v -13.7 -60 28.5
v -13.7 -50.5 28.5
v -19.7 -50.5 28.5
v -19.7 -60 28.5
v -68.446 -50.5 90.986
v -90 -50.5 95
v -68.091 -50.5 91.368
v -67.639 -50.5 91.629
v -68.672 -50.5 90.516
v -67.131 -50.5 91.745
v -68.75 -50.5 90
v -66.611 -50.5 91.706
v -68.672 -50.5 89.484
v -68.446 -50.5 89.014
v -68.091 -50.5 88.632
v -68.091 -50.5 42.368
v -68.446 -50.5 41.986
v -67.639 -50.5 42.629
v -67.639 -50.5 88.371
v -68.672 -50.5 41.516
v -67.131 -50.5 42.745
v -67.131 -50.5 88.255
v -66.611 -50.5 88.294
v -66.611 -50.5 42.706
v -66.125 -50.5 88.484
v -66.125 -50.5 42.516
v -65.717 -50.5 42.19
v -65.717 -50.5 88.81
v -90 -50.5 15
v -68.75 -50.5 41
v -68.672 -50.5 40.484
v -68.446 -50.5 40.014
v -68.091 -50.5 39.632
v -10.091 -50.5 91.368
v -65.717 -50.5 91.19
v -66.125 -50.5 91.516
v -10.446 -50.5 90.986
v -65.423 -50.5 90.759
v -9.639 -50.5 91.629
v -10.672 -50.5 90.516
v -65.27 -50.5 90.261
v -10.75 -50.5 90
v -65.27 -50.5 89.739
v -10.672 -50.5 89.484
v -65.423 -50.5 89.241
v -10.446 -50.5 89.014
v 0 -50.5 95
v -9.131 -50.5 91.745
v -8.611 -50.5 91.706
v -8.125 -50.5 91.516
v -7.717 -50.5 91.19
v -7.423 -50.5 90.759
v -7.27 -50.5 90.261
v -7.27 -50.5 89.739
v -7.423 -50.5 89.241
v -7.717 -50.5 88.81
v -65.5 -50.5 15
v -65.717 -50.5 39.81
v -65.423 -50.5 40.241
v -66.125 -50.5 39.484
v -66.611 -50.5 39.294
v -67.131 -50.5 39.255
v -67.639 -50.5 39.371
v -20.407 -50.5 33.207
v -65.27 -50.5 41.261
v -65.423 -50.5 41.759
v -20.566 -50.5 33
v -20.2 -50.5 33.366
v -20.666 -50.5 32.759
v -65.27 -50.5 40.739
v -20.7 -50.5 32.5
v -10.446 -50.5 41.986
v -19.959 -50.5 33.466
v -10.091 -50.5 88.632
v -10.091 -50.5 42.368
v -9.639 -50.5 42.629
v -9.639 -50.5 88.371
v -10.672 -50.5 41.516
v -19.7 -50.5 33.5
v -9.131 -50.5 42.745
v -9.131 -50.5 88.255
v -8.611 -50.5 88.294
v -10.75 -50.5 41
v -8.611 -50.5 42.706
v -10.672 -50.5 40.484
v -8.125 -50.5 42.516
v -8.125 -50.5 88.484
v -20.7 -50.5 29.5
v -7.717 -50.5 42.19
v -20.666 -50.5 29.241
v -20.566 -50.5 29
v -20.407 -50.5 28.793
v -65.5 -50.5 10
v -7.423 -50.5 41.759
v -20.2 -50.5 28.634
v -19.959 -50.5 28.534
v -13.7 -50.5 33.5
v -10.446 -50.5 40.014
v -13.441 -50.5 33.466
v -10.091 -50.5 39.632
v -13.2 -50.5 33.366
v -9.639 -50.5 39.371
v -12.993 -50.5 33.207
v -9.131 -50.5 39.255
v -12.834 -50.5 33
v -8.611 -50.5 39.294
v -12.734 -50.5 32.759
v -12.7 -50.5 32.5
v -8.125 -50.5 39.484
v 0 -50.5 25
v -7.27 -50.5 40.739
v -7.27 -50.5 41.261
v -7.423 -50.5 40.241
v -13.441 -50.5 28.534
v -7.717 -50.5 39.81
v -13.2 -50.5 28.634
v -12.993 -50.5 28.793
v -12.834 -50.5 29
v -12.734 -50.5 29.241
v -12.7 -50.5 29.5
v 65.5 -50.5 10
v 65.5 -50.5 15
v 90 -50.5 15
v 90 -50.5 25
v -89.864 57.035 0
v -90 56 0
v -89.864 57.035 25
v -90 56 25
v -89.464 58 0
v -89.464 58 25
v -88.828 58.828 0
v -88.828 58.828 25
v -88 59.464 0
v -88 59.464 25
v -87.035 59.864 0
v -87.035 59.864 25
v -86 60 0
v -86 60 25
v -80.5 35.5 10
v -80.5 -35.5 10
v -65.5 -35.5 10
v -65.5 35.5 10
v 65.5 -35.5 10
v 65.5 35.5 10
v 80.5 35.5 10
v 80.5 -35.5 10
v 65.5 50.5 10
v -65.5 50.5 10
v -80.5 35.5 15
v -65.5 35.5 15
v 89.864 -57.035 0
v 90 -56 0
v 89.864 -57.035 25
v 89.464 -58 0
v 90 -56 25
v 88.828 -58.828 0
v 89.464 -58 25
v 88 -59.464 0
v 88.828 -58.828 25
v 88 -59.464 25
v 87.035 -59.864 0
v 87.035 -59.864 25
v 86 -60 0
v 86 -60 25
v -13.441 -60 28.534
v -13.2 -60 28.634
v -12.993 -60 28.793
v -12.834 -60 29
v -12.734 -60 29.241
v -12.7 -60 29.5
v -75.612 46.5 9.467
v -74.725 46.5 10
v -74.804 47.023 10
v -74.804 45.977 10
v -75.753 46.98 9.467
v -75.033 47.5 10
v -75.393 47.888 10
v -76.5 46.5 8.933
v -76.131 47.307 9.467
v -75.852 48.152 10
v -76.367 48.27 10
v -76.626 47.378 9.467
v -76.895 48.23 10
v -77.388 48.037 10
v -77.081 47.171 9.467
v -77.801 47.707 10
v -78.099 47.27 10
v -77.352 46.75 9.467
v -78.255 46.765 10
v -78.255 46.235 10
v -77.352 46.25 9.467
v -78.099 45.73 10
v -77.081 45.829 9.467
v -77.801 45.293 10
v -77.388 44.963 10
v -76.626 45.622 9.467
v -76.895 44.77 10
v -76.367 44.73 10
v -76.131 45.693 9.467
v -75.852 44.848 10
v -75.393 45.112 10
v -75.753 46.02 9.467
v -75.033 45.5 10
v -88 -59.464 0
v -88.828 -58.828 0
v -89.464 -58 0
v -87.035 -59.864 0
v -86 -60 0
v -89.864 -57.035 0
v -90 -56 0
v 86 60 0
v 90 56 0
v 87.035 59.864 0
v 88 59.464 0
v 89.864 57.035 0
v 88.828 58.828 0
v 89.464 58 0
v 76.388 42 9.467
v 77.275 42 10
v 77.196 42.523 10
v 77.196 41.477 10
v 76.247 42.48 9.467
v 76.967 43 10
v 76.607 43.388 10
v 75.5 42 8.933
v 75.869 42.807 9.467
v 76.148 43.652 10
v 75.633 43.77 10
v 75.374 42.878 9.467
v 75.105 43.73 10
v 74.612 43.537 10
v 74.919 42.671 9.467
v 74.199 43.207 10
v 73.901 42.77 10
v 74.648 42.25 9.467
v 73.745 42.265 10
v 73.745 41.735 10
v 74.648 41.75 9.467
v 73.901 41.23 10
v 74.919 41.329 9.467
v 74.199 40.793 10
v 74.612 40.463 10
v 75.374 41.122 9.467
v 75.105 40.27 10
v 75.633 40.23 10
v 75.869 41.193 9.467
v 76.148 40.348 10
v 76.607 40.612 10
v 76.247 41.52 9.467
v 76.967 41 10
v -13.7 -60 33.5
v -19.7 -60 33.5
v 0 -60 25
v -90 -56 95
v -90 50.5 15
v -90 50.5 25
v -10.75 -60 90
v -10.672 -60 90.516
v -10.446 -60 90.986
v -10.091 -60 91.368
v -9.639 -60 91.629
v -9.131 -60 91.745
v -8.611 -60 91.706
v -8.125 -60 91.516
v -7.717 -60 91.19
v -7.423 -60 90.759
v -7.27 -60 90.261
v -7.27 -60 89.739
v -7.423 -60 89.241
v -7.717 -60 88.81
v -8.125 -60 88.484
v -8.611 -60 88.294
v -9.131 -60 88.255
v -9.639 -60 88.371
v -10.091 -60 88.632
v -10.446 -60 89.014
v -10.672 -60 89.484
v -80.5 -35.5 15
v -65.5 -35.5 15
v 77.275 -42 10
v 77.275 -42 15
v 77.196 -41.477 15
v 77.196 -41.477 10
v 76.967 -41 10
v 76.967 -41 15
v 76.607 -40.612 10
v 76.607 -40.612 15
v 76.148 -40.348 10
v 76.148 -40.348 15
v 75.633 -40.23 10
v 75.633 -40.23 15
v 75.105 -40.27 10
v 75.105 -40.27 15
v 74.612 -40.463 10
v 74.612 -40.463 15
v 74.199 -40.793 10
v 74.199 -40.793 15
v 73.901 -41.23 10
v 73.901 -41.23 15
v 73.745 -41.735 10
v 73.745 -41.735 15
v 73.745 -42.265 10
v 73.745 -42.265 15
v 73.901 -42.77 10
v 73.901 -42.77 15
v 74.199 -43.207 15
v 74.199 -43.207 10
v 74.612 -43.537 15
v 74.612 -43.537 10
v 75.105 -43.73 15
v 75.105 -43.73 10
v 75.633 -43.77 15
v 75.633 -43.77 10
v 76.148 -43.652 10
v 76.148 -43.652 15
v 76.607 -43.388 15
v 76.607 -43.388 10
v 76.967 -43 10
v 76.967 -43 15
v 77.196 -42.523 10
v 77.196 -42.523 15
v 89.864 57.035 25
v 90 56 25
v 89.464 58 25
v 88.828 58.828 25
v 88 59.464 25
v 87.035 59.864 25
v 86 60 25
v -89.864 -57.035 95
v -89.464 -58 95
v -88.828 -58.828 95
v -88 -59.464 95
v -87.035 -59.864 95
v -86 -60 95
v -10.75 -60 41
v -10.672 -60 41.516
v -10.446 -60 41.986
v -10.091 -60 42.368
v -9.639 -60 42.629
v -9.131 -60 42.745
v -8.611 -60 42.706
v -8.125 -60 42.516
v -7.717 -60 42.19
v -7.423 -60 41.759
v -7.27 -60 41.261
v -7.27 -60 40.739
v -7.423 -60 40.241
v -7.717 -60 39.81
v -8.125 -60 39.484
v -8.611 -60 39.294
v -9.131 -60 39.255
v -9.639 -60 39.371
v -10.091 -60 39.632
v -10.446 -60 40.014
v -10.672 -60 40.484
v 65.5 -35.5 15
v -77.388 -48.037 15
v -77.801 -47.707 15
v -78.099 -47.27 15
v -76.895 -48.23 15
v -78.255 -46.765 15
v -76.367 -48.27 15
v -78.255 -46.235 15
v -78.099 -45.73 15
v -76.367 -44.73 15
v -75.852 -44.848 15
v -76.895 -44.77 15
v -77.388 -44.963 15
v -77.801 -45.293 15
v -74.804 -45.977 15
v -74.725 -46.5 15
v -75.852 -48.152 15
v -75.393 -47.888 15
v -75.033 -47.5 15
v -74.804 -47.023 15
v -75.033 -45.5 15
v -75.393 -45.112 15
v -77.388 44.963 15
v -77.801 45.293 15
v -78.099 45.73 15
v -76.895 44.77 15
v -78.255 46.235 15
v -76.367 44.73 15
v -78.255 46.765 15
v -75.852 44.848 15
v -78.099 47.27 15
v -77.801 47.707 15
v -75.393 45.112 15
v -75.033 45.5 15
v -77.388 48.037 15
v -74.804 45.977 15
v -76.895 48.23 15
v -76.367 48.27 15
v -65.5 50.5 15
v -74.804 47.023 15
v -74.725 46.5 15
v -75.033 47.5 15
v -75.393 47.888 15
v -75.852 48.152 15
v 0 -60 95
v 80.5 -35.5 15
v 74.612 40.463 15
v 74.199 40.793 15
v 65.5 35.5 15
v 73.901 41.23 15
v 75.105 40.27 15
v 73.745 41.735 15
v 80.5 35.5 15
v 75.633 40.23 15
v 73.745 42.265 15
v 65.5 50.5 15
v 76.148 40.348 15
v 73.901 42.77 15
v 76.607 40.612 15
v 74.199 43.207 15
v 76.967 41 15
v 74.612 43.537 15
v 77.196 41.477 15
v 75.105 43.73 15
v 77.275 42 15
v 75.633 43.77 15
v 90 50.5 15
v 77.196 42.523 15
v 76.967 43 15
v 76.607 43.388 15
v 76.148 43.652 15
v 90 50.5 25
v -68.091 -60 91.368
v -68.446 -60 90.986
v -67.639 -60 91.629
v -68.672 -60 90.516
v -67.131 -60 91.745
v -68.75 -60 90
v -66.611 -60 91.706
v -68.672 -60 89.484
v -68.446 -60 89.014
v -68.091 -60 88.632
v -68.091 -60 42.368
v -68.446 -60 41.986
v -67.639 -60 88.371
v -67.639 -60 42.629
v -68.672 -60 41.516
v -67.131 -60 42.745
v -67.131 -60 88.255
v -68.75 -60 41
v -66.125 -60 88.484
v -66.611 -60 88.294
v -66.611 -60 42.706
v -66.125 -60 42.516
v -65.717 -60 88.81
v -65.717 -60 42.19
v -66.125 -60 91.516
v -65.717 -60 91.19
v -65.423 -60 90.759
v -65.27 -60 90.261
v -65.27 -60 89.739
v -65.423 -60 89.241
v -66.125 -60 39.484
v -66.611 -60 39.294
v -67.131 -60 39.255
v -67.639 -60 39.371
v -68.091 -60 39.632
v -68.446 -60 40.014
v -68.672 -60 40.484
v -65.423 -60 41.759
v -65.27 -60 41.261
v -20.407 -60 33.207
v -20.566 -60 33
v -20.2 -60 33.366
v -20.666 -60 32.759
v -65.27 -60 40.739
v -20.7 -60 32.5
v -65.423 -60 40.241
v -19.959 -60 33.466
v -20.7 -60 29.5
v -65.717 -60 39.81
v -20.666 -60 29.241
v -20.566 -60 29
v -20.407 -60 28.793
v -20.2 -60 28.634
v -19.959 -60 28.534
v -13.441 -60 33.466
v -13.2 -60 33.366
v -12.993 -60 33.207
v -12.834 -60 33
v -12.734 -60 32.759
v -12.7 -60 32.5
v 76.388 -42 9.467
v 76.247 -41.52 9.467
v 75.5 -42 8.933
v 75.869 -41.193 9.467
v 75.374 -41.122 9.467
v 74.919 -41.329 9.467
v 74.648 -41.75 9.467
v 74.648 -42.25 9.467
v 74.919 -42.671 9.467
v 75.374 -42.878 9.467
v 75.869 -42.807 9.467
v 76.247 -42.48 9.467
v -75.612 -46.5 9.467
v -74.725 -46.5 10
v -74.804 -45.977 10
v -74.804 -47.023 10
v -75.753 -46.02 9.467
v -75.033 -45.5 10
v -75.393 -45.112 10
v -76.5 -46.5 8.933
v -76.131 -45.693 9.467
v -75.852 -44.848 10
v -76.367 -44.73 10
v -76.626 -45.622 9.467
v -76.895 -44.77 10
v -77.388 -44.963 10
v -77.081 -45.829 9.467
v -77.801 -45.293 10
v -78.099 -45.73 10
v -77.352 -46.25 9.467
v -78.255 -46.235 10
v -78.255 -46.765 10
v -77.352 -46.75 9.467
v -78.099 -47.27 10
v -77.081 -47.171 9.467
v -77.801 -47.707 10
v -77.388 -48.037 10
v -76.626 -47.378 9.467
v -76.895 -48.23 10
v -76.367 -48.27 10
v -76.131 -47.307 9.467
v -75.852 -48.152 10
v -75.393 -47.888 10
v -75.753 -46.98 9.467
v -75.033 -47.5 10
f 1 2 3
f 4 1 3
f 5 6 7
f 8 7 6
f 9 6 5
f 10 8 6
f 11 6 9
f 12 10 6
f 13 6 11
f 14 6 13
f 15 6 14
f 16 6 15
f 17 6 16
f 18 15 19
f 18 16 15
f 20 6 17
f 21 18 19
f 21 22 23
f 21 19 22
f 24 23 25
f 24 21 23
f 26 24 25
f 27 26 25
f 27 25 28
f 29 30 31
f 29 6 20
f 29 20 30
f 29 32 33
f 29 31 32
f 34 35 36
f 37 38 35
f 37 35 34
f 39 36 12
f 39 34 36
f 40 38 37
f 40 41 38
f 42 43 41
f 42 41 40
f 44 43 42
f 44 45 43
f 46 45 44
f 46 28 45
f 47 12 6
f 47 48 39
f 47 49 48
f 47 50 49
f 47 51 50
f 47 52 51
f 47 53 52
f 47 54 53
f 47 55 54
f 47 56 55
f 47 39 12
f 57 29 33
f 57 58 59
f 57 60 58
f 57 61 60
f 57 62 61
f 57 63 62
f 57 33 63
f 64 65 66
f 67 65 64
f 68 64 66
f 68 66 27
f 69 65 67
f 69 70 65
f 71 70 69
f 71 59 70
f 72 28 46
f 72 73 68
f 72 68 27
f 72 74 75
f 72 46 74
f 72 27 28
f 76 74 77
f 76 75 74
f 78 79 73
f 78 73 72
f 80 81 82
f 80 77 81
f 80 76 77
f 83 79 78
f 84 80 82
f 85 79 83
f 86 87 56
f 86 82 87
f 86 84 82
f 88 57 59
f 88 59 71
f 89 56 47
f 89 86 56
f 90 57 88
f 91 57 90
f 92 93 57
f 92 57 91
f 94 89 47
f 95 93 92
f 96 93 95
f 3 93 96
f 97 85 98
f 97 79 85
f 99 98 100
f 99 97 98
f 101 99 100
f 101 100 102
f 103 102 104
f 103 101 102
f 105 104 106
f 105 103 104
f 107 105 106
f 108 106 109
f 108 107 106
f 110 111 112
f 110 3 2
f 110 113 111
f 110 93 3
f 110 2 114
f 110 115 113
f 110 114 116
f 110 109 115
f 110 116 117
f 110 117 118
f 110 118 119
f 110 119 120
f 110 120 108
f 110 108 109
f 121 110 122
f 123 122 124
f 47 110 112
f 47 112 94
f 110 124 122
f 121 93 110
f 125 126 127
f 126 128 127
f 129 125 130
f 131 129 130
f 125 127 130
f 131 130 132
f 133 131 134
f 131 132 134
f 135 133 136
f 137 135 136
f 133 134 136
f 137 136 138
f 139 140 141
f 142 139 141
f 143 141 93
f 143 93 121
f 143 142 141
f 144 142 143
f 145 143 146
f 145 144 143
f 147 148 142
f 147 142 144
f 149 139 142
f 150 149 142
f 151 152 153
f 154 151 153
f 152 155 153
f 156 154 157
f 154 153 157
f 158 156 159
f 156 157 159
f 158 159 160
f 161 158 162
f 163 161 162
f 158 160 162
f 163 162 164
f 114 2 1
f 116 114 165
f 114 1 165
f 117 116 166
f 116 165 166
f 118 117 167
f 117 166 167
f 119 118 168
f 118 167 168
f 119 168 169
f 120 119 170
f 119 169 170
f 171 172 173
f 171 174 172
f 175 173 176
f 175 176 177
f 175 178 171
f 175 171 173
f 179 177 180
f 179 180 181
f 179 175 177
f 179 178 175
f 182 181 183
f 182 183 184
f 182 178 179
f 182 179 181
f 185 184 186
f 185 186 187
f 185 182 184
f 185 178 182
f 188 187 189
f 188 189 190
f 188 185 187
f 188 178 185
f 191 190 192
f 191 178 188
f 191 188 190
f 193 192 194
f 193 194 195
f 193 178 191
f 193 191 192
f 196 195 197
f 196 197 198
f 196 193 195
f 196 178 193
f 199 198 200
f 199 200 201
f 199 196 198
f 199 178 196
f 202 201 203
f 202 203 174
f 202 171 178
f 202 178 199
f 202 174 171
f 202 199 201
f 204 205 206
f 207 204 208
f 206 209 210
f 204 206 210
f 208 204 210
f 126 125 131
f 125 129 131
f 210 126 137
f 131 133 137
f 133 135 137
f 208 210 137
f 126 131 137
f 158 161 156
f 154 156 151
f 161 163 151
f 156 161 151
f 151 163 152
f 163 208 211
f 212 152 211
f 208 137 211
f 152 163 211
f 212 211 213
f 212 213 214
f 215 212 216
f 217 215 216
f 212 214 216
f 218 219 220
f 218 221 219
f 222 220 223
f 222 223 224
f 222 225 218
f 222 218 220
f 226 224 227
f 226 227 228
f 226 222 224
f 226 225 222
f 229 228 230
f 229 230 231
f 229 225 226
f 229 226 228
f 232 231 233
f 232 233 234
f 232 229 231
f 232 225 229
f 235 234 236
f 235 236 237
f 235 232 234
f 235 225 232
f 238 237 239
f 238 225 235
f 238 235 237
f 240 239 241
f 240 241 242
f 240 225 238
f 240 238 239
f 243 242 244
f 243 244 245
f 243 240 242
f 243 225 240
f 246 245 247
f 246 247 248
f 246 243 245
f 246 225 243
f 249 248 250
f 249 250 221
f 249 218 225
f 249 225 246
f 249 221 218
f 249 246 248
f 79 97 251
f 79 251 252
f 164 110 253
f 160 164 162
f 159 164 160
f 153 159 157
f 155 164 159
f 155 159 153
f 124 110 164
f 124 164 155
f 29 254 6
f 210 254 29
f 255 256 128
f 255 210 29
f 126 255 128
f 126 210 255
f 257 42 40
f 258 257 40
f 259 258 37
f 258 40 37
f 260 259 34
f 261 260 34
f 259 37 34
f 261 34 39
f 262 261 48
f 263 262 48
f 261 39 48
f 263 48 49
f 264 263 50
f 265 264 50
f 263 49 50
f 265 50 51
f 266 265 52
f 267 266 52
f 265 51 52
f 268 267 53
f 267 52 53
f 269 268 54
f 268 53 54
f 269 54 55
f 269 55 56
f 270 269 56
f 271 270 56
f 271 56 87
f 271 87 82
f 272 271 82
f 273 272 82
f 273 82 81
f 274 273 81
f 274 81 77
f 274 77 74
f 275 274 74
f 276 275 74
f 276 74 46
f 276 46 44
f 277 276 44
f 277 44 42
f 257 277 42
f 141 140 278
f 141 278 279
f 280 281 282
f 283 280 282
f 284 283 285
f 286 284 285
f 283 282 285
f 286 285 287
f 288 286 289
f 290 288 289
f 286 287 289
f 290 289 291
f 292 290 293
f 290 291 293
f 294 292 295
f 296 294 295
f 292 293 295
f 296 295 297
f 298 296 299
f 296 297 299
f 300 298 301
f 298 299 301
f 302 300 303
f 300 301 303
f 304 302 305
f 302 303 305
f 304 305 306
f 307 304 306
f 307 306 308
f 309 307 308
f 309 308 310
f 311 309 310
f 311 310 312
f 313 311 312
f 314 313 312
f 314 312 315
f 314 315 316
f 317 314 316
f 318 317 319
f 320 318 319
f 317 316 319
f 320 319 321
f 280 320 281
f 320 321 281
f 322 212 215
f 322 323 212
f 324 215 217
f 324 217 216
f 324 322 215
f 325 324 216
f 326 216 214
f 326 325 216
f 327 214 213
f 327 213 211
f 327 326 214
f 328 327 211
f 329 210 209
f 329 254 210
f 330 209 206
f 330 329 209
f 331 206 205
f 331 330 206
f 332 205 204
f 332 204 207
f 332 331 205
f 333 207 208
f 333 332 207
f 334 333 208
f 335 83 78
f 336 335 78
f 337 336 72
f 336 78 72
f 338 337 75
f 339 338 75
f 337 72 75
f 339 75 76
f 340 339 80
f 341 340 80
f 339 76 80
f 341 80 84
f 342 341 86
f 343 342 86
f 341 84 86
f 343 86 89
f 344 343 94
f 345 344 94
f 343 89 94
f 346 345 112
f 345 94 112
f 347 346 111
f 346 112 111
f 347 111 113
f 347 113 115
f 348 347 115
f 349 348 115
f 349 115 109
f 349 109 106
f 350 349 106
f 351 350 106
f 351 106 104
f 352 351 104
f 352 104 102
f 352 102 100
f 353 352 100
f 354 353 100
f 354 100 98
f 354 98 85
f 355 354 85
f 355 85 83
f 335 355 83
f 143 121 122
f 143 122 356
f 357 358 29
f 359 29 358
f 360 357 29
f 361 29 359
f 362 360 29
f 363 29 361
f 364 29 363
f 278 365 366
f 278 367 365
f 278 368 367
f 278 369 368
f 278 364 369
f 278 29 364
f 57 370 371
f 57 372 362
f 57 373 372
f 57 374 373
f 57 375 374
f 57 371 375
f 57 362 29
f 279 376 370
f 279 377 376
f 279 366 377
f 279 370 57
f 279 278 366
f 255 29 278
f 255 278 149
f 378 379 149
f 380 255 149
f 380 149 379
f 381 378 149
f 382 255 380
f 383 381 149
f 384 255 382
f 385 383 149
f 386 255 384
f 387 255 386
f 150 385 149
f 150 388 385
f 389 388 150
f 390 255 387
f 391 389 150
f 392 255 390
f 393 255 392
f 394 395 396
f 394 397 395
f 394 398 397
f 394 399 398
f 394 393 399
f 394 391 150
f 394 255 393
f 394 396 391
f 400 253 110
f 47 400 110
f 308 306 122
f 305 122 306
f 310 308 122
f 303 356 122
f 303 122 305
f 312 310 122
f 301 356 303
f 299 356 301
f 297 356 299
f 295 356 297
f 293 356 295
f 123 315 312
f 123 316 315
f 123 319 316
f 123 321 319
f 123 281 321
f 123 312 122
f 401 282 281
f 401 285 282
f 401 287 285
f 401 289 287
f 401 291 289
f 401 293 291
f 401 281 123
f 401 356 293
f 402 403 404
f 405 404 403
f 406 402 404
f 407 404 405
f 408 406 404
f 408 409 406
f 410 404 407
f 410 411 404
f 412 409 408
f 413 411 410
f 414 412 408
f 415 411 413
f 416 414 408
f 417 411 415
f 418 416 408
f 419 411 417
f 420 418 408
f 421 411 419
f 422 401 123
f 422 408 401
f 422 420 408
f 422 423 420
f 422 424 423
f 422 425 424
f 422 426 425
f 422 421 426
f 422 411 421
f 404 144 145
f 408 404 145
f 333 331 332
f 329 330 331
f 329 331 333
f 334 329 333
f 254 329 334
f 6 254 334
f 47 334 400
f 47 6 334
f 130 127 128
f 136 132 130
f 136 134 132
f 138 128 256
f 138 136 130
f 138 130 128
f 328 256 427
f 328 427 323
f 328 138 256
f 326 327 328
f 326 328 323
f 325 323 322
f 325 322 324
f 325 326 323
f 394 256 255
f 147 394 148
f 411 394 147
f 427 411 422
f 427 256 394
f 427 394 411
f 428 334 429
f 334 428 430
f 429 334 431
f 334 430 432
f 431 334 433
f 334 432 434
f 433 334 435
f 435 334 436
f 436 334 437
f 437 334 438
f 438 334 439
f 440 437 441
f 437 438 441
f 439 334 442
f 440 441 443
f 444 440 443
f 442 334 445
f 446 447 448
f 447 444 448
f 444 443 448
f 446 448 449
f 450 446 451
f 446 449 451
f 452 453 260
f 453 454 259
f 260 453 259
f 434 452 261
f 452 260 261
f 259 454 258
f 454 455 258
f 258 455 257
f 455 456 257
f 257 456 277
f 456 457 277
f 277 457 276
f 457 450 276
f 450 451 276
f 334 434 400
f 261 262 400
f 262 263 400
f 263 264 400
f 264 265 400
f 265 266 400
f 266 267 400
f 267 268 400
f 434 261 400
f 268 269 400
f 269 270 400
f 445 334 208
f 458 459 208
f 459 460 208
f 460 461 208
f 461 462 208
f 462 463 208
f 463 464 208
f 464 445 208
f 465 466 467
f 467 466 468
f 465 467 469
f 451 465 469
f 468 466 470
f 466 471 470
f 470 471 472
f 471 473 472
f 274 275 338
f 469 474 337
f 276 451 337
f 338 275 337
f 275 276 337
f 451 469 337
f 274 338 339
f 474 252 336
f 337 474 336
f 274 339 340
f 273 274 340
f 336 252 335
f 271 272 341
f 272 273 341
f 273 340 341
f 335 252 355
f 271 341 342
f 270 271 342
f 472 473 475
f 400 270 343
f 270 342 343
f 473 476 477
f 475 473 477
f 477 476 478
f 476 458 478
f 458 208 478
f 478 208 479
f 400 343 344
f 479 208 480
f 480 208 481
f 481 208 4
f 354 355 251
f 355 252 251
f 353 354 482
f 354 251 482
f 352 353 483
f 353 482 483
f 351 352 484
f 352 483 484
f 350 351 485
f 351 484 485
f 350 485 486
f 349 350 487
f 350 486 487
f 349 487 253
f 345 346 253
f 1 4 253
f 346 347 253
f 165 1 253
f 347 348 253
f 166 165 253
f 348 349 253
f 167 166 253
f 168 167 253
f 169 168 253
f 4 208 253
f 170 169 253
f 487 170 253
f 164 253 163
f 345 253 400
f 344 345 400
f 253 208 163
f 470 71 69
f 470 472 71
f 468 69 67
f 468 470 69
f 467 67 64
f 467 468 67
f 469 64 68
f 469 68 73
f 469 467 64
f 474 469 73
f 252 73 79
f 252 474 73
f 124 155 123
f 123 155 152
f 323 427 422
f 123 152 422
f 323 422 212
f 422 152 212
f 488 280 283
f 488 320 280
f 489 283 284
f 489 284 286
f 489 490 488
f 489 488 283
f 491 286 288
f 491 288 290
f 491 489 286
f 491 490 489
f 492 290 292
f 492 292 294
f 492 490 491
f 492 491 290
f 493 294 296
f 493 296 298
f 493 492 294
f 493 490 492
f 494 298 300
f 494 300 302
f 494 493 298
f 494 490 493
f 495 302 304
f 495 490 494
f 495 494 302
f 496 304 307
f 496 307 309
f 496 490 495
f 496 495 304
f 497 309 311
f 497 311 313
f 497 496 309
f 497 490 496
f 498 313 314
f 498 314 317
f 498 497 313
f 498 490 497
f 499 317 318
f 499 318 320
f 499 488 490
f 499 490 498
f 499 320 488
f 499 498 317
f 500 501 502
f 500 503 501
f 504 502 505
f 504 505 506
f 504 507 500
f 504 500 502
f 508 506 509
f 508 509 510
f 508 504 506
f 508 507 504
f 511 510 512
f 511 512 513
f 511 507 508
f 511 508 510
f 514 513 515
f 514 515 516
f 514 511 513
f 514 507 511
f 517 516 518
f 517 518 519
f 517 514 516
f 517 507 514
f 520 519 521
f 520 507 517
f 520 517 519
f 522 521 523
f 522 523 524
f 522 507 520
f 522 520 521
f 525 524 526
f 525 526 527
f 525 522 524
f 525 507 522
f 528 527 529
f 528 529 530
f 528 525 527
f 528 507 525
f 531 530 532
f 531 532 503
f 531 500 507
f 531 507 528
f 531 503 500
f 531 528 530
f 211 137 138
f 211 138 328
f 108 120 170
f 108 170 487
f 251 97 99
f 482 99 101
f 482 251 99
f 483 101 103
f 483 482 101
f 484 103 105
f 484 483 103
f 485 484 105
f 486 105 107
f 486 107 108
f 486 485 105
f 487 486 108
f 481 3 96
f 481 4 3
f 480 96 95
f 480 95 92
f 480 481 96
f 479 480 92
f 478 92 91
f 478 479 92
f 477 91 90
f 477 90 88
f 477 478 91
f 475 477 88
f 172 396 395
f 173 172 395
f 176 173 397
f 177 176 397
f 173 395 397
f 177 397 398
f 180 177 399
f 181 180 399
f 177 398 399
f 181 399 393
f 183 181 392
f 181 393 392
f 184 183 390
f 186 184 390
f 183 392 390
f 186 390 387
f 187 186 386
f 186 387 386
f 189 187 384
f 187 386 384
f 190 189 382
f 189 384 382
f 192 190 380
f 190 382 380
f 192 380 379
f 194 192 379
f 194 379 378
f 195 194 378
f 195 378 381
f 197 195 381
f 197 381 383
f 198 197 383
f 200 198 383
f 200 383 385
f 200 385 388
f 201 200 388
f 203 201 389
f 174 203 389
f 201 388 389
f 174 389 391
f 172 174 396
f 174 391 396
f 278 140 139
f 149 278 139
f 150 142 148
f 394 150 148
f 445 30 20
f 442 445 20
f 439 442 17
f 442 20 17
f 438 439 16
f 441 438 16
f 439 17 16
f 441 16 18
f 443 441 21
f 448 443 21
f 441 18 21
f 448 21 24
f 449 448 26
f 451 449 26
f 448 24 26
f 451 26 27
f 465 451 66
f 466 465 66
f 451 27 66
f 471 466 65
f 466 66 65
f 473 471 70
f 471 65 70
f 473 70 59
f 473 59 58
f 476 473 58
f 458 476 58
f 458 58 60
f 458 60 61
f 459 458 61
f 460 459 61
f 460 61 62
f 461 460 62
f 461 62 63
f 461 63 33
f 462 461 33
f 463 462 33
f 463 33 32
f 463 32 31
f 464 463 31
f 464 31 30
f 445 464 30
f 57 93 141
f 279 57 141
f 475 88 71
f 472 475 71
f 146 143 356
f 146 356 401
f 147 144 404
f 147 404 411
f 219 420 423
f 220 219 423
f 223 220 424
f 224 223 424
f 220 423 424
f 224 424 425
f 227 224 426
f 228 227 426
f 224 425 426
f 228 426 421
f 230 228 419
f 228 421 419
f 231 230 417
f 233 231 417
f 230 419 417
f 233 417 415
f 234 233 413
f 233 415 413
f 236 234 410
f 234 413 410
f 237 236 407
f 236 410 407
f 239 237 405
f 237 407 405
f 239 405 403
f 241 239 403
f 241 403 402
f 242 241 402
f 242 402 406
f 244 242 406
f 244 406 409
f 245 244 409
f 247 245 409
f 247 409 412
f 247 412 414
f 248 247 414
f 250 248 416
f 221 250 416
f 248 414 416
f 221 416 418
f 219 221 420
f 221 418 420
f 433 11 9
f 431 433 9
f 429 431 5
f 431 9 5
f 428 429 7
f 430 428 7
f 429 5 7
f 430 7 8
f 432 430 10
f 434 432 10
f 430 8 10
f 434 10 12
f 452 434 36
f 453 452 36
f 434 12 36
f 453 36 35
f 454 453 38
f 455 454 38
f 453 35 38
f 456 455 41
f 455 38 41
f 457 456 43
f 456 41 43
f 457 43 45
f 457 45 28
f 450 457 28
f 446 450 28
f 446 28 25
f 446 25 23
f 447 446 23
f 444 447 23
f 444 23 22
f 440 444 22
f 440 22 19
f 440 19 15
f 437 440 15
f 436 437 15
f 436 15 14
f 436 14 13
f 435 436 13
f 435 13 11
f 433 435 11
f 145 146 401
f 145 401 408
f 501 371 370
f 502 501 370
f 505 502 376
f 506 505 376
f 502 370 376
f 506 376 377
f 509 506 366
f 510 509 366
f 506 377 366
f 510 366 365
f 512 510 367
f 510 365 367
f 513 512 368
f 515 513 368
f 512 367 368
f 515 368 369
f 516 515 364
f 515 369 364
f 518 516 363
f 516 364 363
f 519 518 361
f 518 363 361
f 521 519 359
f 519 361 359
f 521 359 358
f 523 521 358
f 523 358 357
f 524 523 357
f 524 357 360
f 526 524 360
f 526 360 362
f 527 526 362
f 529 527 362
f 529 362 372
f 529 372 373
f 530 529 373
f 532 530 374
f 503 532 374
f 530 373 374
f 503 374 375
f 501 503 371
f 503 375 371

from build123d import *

# Parameters (mm, degrees)
SKETCH_W        = 161
SKETCH_H        = 101
PAD_DEPTH       = 10
SKETCH001_W     = 15
SKETCH001_H     = 15
PAD001_DEPTH    = 5
SKETCH003_R     = 1.775
HOLE_DEPTH      = 5
HOLE_TIPS_R     = 1.775
SKETCH005_W     = 180
SKETCH005_H     = 120
SKETCH005_W_2   = 161
SKETCH005_H_2   = 101
PAD002_DEPTH    = 25
SKETCH006_W     = 9.5
SKETCH006_H     = 101
POCKET_DEPTH    = 10
SKETCH007_W     = 9.5
SKETCH007_H     = 101
POCKET001_DEPTH = 10
SKETCH008_W     = 90
SKETCH008_H     = 9.5
PAD003_DEPTH    = 70
SKETCH009_R     = 1.75
HOLE001_DEPTH   = 25
SKETCH010_W     = 8
SKETCH010_H     = 5
POCKET002_DEPTH = 10
FILLET_R        = 1
FILLET001_R     = 4


with BuildPart() as part:
    # Sketch → Pad (new body)
    with BuildSketch(Plane.XY):
        Rectangle(SKETCH_W, SKETCH_H)
    extrude(amount=PAD_DEPTH)

    # Sketch001 (on Face6 of Pad) → Pad001 (join)
    with BuildSketch(Plane.XY.offset(10)):
        with Locations((-73, 43)):
            Rectangle(SKETCH001_W, SKETCH001_H)
        with Locations((-73, -43)):
            Rectangle(SKETCH001_W, SKETCH001_H)
        with Locations((73, -43)):
            Rectangle(SKETCH001_W, SKETCH001_H)
        with Locations((73, 43)):
            Rectangle(SKETCH001_W, SKETCH001_H)
    extrude(amount=PAD001_DEPTH)

    # Sketch003 (on Face25 of Pad001) → Hole (cut)
    with BuildSketch(Plane.XY.offset(15)):
        with Locations((-76.5, -46.5)):
            Circle(SKETCH003_R)
        with Locations((-76.5, 46.5)):
            Circle(SKETCH003_R)
        with Locations((75.5, -42)):
            Circle(SKETCH003_R)
        with Locations((75.5, 42)):
            Circle(SKETCH003_R)
    extrude(amount=-HOLE_DEPTH, mode=Mode.SUBTRACT)

    # Hole tips → Hole tip 1 section 0
    with BuildSketch(Plane.XY.offset(10), mode=Mode.PRIVATE) as hole_tip_1_s0:
        with Locations((-76.5, -46.5)):
            Circle(HOLE_TIPS_R)
    loft([hole_tip_1_s0.sketch, Vertex(-76.5, -46.5, 8.933472)], mode=Mode.SUBTRACT)

    # Hole tips → Hole tip 2 section 0
    with BuildSketch(Plane.XY.offset(10), mode=Mode.PRIVATE) as hole_tip_2_s0:
        with Locations((-76.5, 46.5)):
            Circle(HOLE_TIPS_R)
    loft([hole_tip_2_s0.sketch, Vertex(-76.5, 46.5, 8.933472)], mode=Mode.SUBTRACT)

    # Hole tips → Hole tip 3 section 0
    with BuildSketch(Plane.XY.offset(10), mode=Mode.PRIVATE) as hole_tip_3_s0:
        with Locations((75.5, -42)):
            Circle(HOLE_TIPS_R)
    loft([hole_tip_3_s0.sketch, Vertex(75.5, -42, 8.933472)], mode=Mode.SUBTRACT)

    # Hole tips → Hole tip 4 section 0
    with BuildSketch(Plane.XY.offset(10), mode=Mode.PRIVATE) as hole_tip_4_s0:
        with Locations((75.5, 42)):
            Circle(HOLE_TIPS_R)
    loft([hole_tip_4_s0.sketch, Vertex(75.5, 42, 8.933472)], mode=Mode.SUBTRACT)

    # Sketch005 → Pad002 (join)
    with BuildSketch(Plane.XY):
        Rectangle(SKETCH005_W, SKETCH005_H)
        Rectangle(SKETCH005_W_2, SKETCH005_H_2, mode=Mode.SUBTRACT)
    extrude(amount=PAD002_DEPTH)

    # Sketch006 (on Face7 of Pad002) → Pocket (cut)
    with BuildSketch(Plane.XY.offset(25)):
        with Locations((85.25, 0)):
            Rectangle(SKETCH006_W, SKETCH006_H)
    extrude(amount=-POCKET_DEPTH, mode=Mode.SUBTRACT)

    # Sketch007 (on Face7 of Pocket) → Pocket001 (cut)
    with BuildSketch(Plane.XY.offset(25)):
        with Locations((-85.25, 0)):
            Rectangle(SKETCH007_W, SKETCH007_H)
    extrude(amount=-POCKET001_DEPTH, mode=Mode.SUBTRACT)

    # Sketch008 (on Face7 of Pocket001) → Pad003 (join)
    with BuildSketch(Plane.XY.offset(25)):
        with Locations((-45, -55.25)):
            Rectangle(SKETCH008_W, SKETCH008_H)
    extrude(amount=PAD003_DEPTH)

    # Sketch009 (on Face18 of Pad003) → Hole001 (cut)
    with BuildSketch(Plane(origin=(0, -50.5, 0), x_dir=(-1, 0, 0), z_dir=(0, 1, 0))):
        with Locations((67, 90)):
            Circle(SKETCH009_R)
        with Locations((9, 90)):
            Circle(SKETCH009_R)
        with Locations((9, 41)):
            Circle(SKETCH009_R)
        with Locations((67, 41)):
            Circle(SKETCH009_R)
    extrude(amount=-HOLE001_DEPTH, mode=Mode.SUBTRACT)

    # Sketch010 (on Face18 of Hole001) → Pocket002 (cut)
    with BuildSketch(Plane(origin=(0, -50.5, 0), x_dir=(-1, 0, 0), z_dir=(0, 1, 0))):
        with Locations((16.7, 31)):
            Rectangle(SKETCH010_W, SKETCH010_H)
    extrude(amount=-POCKET002_DEPTH, mode=Mode.SUBTRACT)

    # Fillet
    fillet_edges = [part.edges().sort_by_distance(p)[0] for p in [
        (-20.7, -55.25, 33.5),
        (-12.7, -55.25, 33.5),
        (-20.7, -55.25, 28.5),
        (-12.7, -55.25, 28.5),
    ]]
    fillet(fillet_edges, radius=FILLET_R)

    # Fillet001
    fillet001_edges = [part.edges().sort_by_distance(p)[0] for p in [
        (90, -60, 12.5),
        (90, 60, 12.5),
        (-90, 60, 12.5),
        (-90, -60, 12.5),
        (-90, -60, 60),
    ]]
    fillet(fillet001_edges, radius=FILLET001_R)


solid = part.part
